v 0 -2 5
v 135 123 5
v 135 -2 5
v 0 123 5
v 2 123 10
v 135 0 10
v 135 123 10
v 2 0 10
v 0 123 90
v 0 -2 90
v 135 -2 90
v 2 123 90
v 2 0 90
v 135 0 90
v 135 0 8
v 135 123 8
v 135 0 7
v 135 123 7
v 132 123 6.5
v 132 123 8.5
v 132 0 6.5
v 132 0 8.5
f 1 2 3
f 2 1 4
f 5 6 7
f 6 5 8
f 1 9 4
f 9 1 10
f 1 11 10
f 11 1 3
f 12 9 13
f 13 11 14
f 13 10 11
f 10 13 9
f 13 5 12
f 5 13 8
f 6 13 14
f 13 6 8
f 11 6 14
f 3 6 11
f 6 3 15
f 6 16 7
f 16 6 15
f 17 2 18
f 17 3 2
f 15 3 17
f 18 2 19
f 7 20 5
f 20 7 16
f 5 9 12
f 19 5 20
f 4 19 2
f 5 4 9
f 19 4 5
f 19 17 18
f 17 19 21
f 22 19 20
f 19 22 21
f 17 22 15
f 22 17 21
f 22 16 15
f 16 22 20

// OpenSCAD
// Bag Base
overallWidth=370;
//overallWidth=350;
overallDepth=250;
overallHeight = 85;

// Tray Width
//trayWidth = (overallWidth - 11)/2;
trayWidth = overallWidth;
trayDepth = overallDepth;

//baseProfile();
bottleWidth = 32;
bottleDepth = 20;

bottleTolerance = 1;
thickness = 2;
baseThickness = 5;

//dovetail(90);
translate([0, -thickness, baseThickness]) {
difference() {
    intersection() {
        translate([0, 0, baseThickness])
        drawer();
        cube([135, overallDepth/2, overallHeight]);
    }

    translate([135-3, thickness, 0])
    rotate([-90, 0, 0])
    dovetail(overallDepth/2);
}
}

translate([0, -thickness, baseThickness]) {
    //inlay();
    //drawer();
}

module drawer() {
    union() {
        translate([0,0,-baseThickness])
        linear_extrude(height=baseThickness)
        baseProfile();

        linear_extrude(height=overallHeight-baseThickness) {
            difference() {
                baseProfile();
                offset(-thickness) {
                    baseProfile();
                }
            }
        }
    }
}

module inlay() {
    difference() {
        linear_extrude(height=30)
        intersection() {
            baseProfile();
            wells();
        }
        drawer();
    }
}


module wells() {

    insideWidth = bottleWidth + 2 * bottleTolerance;
    insideDepth = bottleDepth + 2 * bottleTolerance;

    outsideWidth = insideWidth + 2 * thickness;
    outsideDepth = insideDepth + 2 * thickness;

    angle = 60;

    offsetX = (insideWidth + thickness) * cos(angle);
    offsetY = (insideDepth + thickness) * sin(angle);

    xCount = (trayWidth - outsideWidth) / (offsetX);
    yCount = (trayDepth - outsideDepth) / (offsetY);

    
    evenRows = (floor((xCount)/2)+1);
    evenCols = (floor((yCount)/2)+1);
    
    echo(evenRows, " "  ,evenCols);
    
    oddRows = (floor((xCount)/2));
    oddCols = (floor((yCount)/2));
    
    evenUsedWidth = evenRows*(insideWidth) + (evenRows+1)*thickness;
    usedWidth = max(evenUsedWidth);

    count = evenRows * evenCols + oddRows * oddCols;
    echo("Total Wells = ", count);
    union() {
        translate([outsideWidth/2 + (overallWidth - usedWidth)/2, outsideDepth/2, 0]) {
            for(x = [0:2:xCount]) {
                for(y = [0:2:yCount]) {
                    translate([offsetX * x, offsetY * y, 0]) well();
                }
            }

            for(x = [1:2:xCount]) {
                for(y = [1:2:yCount]) {
                    translate([offsetX * x, offsetY * y, 0]) well();            
                }
            }
        }
    }
    
    module well(){
        difference() {
            oval(outsideWidth, outsideDepth);
            oval(insideWidth, insideDepth);
        }
    }
}
module baseProfile() {
    
    
    handleSpacing = 170;
    handleWidth = 30;
    handleDepth = 30;

    difference() {
            square([overallWidth,overallDepth]);
    
        translate([overallWidth/2-(handleSpacing/2+handleWidth/2), overallDepth-handleDepth, 0])
            square([handleWidth, handleDepth + 2]);
        
        translate([(overallWidth/2 + handleSpacing/2-handleWidth/2), overallDepth-handleDepth, 0]) 
            square([handleWidth, handleDepth + 2]);
    }
}


module oval(x, y) {
    scale([1, y/x]) circle(d=x);
}
module dovetail(length) {
    linear_extrude(height=length)
    polygon(points=[
        [0, -1.5],
        [0, -3.5],
        [3, -3],
        [3, -2]
    ]);
}
